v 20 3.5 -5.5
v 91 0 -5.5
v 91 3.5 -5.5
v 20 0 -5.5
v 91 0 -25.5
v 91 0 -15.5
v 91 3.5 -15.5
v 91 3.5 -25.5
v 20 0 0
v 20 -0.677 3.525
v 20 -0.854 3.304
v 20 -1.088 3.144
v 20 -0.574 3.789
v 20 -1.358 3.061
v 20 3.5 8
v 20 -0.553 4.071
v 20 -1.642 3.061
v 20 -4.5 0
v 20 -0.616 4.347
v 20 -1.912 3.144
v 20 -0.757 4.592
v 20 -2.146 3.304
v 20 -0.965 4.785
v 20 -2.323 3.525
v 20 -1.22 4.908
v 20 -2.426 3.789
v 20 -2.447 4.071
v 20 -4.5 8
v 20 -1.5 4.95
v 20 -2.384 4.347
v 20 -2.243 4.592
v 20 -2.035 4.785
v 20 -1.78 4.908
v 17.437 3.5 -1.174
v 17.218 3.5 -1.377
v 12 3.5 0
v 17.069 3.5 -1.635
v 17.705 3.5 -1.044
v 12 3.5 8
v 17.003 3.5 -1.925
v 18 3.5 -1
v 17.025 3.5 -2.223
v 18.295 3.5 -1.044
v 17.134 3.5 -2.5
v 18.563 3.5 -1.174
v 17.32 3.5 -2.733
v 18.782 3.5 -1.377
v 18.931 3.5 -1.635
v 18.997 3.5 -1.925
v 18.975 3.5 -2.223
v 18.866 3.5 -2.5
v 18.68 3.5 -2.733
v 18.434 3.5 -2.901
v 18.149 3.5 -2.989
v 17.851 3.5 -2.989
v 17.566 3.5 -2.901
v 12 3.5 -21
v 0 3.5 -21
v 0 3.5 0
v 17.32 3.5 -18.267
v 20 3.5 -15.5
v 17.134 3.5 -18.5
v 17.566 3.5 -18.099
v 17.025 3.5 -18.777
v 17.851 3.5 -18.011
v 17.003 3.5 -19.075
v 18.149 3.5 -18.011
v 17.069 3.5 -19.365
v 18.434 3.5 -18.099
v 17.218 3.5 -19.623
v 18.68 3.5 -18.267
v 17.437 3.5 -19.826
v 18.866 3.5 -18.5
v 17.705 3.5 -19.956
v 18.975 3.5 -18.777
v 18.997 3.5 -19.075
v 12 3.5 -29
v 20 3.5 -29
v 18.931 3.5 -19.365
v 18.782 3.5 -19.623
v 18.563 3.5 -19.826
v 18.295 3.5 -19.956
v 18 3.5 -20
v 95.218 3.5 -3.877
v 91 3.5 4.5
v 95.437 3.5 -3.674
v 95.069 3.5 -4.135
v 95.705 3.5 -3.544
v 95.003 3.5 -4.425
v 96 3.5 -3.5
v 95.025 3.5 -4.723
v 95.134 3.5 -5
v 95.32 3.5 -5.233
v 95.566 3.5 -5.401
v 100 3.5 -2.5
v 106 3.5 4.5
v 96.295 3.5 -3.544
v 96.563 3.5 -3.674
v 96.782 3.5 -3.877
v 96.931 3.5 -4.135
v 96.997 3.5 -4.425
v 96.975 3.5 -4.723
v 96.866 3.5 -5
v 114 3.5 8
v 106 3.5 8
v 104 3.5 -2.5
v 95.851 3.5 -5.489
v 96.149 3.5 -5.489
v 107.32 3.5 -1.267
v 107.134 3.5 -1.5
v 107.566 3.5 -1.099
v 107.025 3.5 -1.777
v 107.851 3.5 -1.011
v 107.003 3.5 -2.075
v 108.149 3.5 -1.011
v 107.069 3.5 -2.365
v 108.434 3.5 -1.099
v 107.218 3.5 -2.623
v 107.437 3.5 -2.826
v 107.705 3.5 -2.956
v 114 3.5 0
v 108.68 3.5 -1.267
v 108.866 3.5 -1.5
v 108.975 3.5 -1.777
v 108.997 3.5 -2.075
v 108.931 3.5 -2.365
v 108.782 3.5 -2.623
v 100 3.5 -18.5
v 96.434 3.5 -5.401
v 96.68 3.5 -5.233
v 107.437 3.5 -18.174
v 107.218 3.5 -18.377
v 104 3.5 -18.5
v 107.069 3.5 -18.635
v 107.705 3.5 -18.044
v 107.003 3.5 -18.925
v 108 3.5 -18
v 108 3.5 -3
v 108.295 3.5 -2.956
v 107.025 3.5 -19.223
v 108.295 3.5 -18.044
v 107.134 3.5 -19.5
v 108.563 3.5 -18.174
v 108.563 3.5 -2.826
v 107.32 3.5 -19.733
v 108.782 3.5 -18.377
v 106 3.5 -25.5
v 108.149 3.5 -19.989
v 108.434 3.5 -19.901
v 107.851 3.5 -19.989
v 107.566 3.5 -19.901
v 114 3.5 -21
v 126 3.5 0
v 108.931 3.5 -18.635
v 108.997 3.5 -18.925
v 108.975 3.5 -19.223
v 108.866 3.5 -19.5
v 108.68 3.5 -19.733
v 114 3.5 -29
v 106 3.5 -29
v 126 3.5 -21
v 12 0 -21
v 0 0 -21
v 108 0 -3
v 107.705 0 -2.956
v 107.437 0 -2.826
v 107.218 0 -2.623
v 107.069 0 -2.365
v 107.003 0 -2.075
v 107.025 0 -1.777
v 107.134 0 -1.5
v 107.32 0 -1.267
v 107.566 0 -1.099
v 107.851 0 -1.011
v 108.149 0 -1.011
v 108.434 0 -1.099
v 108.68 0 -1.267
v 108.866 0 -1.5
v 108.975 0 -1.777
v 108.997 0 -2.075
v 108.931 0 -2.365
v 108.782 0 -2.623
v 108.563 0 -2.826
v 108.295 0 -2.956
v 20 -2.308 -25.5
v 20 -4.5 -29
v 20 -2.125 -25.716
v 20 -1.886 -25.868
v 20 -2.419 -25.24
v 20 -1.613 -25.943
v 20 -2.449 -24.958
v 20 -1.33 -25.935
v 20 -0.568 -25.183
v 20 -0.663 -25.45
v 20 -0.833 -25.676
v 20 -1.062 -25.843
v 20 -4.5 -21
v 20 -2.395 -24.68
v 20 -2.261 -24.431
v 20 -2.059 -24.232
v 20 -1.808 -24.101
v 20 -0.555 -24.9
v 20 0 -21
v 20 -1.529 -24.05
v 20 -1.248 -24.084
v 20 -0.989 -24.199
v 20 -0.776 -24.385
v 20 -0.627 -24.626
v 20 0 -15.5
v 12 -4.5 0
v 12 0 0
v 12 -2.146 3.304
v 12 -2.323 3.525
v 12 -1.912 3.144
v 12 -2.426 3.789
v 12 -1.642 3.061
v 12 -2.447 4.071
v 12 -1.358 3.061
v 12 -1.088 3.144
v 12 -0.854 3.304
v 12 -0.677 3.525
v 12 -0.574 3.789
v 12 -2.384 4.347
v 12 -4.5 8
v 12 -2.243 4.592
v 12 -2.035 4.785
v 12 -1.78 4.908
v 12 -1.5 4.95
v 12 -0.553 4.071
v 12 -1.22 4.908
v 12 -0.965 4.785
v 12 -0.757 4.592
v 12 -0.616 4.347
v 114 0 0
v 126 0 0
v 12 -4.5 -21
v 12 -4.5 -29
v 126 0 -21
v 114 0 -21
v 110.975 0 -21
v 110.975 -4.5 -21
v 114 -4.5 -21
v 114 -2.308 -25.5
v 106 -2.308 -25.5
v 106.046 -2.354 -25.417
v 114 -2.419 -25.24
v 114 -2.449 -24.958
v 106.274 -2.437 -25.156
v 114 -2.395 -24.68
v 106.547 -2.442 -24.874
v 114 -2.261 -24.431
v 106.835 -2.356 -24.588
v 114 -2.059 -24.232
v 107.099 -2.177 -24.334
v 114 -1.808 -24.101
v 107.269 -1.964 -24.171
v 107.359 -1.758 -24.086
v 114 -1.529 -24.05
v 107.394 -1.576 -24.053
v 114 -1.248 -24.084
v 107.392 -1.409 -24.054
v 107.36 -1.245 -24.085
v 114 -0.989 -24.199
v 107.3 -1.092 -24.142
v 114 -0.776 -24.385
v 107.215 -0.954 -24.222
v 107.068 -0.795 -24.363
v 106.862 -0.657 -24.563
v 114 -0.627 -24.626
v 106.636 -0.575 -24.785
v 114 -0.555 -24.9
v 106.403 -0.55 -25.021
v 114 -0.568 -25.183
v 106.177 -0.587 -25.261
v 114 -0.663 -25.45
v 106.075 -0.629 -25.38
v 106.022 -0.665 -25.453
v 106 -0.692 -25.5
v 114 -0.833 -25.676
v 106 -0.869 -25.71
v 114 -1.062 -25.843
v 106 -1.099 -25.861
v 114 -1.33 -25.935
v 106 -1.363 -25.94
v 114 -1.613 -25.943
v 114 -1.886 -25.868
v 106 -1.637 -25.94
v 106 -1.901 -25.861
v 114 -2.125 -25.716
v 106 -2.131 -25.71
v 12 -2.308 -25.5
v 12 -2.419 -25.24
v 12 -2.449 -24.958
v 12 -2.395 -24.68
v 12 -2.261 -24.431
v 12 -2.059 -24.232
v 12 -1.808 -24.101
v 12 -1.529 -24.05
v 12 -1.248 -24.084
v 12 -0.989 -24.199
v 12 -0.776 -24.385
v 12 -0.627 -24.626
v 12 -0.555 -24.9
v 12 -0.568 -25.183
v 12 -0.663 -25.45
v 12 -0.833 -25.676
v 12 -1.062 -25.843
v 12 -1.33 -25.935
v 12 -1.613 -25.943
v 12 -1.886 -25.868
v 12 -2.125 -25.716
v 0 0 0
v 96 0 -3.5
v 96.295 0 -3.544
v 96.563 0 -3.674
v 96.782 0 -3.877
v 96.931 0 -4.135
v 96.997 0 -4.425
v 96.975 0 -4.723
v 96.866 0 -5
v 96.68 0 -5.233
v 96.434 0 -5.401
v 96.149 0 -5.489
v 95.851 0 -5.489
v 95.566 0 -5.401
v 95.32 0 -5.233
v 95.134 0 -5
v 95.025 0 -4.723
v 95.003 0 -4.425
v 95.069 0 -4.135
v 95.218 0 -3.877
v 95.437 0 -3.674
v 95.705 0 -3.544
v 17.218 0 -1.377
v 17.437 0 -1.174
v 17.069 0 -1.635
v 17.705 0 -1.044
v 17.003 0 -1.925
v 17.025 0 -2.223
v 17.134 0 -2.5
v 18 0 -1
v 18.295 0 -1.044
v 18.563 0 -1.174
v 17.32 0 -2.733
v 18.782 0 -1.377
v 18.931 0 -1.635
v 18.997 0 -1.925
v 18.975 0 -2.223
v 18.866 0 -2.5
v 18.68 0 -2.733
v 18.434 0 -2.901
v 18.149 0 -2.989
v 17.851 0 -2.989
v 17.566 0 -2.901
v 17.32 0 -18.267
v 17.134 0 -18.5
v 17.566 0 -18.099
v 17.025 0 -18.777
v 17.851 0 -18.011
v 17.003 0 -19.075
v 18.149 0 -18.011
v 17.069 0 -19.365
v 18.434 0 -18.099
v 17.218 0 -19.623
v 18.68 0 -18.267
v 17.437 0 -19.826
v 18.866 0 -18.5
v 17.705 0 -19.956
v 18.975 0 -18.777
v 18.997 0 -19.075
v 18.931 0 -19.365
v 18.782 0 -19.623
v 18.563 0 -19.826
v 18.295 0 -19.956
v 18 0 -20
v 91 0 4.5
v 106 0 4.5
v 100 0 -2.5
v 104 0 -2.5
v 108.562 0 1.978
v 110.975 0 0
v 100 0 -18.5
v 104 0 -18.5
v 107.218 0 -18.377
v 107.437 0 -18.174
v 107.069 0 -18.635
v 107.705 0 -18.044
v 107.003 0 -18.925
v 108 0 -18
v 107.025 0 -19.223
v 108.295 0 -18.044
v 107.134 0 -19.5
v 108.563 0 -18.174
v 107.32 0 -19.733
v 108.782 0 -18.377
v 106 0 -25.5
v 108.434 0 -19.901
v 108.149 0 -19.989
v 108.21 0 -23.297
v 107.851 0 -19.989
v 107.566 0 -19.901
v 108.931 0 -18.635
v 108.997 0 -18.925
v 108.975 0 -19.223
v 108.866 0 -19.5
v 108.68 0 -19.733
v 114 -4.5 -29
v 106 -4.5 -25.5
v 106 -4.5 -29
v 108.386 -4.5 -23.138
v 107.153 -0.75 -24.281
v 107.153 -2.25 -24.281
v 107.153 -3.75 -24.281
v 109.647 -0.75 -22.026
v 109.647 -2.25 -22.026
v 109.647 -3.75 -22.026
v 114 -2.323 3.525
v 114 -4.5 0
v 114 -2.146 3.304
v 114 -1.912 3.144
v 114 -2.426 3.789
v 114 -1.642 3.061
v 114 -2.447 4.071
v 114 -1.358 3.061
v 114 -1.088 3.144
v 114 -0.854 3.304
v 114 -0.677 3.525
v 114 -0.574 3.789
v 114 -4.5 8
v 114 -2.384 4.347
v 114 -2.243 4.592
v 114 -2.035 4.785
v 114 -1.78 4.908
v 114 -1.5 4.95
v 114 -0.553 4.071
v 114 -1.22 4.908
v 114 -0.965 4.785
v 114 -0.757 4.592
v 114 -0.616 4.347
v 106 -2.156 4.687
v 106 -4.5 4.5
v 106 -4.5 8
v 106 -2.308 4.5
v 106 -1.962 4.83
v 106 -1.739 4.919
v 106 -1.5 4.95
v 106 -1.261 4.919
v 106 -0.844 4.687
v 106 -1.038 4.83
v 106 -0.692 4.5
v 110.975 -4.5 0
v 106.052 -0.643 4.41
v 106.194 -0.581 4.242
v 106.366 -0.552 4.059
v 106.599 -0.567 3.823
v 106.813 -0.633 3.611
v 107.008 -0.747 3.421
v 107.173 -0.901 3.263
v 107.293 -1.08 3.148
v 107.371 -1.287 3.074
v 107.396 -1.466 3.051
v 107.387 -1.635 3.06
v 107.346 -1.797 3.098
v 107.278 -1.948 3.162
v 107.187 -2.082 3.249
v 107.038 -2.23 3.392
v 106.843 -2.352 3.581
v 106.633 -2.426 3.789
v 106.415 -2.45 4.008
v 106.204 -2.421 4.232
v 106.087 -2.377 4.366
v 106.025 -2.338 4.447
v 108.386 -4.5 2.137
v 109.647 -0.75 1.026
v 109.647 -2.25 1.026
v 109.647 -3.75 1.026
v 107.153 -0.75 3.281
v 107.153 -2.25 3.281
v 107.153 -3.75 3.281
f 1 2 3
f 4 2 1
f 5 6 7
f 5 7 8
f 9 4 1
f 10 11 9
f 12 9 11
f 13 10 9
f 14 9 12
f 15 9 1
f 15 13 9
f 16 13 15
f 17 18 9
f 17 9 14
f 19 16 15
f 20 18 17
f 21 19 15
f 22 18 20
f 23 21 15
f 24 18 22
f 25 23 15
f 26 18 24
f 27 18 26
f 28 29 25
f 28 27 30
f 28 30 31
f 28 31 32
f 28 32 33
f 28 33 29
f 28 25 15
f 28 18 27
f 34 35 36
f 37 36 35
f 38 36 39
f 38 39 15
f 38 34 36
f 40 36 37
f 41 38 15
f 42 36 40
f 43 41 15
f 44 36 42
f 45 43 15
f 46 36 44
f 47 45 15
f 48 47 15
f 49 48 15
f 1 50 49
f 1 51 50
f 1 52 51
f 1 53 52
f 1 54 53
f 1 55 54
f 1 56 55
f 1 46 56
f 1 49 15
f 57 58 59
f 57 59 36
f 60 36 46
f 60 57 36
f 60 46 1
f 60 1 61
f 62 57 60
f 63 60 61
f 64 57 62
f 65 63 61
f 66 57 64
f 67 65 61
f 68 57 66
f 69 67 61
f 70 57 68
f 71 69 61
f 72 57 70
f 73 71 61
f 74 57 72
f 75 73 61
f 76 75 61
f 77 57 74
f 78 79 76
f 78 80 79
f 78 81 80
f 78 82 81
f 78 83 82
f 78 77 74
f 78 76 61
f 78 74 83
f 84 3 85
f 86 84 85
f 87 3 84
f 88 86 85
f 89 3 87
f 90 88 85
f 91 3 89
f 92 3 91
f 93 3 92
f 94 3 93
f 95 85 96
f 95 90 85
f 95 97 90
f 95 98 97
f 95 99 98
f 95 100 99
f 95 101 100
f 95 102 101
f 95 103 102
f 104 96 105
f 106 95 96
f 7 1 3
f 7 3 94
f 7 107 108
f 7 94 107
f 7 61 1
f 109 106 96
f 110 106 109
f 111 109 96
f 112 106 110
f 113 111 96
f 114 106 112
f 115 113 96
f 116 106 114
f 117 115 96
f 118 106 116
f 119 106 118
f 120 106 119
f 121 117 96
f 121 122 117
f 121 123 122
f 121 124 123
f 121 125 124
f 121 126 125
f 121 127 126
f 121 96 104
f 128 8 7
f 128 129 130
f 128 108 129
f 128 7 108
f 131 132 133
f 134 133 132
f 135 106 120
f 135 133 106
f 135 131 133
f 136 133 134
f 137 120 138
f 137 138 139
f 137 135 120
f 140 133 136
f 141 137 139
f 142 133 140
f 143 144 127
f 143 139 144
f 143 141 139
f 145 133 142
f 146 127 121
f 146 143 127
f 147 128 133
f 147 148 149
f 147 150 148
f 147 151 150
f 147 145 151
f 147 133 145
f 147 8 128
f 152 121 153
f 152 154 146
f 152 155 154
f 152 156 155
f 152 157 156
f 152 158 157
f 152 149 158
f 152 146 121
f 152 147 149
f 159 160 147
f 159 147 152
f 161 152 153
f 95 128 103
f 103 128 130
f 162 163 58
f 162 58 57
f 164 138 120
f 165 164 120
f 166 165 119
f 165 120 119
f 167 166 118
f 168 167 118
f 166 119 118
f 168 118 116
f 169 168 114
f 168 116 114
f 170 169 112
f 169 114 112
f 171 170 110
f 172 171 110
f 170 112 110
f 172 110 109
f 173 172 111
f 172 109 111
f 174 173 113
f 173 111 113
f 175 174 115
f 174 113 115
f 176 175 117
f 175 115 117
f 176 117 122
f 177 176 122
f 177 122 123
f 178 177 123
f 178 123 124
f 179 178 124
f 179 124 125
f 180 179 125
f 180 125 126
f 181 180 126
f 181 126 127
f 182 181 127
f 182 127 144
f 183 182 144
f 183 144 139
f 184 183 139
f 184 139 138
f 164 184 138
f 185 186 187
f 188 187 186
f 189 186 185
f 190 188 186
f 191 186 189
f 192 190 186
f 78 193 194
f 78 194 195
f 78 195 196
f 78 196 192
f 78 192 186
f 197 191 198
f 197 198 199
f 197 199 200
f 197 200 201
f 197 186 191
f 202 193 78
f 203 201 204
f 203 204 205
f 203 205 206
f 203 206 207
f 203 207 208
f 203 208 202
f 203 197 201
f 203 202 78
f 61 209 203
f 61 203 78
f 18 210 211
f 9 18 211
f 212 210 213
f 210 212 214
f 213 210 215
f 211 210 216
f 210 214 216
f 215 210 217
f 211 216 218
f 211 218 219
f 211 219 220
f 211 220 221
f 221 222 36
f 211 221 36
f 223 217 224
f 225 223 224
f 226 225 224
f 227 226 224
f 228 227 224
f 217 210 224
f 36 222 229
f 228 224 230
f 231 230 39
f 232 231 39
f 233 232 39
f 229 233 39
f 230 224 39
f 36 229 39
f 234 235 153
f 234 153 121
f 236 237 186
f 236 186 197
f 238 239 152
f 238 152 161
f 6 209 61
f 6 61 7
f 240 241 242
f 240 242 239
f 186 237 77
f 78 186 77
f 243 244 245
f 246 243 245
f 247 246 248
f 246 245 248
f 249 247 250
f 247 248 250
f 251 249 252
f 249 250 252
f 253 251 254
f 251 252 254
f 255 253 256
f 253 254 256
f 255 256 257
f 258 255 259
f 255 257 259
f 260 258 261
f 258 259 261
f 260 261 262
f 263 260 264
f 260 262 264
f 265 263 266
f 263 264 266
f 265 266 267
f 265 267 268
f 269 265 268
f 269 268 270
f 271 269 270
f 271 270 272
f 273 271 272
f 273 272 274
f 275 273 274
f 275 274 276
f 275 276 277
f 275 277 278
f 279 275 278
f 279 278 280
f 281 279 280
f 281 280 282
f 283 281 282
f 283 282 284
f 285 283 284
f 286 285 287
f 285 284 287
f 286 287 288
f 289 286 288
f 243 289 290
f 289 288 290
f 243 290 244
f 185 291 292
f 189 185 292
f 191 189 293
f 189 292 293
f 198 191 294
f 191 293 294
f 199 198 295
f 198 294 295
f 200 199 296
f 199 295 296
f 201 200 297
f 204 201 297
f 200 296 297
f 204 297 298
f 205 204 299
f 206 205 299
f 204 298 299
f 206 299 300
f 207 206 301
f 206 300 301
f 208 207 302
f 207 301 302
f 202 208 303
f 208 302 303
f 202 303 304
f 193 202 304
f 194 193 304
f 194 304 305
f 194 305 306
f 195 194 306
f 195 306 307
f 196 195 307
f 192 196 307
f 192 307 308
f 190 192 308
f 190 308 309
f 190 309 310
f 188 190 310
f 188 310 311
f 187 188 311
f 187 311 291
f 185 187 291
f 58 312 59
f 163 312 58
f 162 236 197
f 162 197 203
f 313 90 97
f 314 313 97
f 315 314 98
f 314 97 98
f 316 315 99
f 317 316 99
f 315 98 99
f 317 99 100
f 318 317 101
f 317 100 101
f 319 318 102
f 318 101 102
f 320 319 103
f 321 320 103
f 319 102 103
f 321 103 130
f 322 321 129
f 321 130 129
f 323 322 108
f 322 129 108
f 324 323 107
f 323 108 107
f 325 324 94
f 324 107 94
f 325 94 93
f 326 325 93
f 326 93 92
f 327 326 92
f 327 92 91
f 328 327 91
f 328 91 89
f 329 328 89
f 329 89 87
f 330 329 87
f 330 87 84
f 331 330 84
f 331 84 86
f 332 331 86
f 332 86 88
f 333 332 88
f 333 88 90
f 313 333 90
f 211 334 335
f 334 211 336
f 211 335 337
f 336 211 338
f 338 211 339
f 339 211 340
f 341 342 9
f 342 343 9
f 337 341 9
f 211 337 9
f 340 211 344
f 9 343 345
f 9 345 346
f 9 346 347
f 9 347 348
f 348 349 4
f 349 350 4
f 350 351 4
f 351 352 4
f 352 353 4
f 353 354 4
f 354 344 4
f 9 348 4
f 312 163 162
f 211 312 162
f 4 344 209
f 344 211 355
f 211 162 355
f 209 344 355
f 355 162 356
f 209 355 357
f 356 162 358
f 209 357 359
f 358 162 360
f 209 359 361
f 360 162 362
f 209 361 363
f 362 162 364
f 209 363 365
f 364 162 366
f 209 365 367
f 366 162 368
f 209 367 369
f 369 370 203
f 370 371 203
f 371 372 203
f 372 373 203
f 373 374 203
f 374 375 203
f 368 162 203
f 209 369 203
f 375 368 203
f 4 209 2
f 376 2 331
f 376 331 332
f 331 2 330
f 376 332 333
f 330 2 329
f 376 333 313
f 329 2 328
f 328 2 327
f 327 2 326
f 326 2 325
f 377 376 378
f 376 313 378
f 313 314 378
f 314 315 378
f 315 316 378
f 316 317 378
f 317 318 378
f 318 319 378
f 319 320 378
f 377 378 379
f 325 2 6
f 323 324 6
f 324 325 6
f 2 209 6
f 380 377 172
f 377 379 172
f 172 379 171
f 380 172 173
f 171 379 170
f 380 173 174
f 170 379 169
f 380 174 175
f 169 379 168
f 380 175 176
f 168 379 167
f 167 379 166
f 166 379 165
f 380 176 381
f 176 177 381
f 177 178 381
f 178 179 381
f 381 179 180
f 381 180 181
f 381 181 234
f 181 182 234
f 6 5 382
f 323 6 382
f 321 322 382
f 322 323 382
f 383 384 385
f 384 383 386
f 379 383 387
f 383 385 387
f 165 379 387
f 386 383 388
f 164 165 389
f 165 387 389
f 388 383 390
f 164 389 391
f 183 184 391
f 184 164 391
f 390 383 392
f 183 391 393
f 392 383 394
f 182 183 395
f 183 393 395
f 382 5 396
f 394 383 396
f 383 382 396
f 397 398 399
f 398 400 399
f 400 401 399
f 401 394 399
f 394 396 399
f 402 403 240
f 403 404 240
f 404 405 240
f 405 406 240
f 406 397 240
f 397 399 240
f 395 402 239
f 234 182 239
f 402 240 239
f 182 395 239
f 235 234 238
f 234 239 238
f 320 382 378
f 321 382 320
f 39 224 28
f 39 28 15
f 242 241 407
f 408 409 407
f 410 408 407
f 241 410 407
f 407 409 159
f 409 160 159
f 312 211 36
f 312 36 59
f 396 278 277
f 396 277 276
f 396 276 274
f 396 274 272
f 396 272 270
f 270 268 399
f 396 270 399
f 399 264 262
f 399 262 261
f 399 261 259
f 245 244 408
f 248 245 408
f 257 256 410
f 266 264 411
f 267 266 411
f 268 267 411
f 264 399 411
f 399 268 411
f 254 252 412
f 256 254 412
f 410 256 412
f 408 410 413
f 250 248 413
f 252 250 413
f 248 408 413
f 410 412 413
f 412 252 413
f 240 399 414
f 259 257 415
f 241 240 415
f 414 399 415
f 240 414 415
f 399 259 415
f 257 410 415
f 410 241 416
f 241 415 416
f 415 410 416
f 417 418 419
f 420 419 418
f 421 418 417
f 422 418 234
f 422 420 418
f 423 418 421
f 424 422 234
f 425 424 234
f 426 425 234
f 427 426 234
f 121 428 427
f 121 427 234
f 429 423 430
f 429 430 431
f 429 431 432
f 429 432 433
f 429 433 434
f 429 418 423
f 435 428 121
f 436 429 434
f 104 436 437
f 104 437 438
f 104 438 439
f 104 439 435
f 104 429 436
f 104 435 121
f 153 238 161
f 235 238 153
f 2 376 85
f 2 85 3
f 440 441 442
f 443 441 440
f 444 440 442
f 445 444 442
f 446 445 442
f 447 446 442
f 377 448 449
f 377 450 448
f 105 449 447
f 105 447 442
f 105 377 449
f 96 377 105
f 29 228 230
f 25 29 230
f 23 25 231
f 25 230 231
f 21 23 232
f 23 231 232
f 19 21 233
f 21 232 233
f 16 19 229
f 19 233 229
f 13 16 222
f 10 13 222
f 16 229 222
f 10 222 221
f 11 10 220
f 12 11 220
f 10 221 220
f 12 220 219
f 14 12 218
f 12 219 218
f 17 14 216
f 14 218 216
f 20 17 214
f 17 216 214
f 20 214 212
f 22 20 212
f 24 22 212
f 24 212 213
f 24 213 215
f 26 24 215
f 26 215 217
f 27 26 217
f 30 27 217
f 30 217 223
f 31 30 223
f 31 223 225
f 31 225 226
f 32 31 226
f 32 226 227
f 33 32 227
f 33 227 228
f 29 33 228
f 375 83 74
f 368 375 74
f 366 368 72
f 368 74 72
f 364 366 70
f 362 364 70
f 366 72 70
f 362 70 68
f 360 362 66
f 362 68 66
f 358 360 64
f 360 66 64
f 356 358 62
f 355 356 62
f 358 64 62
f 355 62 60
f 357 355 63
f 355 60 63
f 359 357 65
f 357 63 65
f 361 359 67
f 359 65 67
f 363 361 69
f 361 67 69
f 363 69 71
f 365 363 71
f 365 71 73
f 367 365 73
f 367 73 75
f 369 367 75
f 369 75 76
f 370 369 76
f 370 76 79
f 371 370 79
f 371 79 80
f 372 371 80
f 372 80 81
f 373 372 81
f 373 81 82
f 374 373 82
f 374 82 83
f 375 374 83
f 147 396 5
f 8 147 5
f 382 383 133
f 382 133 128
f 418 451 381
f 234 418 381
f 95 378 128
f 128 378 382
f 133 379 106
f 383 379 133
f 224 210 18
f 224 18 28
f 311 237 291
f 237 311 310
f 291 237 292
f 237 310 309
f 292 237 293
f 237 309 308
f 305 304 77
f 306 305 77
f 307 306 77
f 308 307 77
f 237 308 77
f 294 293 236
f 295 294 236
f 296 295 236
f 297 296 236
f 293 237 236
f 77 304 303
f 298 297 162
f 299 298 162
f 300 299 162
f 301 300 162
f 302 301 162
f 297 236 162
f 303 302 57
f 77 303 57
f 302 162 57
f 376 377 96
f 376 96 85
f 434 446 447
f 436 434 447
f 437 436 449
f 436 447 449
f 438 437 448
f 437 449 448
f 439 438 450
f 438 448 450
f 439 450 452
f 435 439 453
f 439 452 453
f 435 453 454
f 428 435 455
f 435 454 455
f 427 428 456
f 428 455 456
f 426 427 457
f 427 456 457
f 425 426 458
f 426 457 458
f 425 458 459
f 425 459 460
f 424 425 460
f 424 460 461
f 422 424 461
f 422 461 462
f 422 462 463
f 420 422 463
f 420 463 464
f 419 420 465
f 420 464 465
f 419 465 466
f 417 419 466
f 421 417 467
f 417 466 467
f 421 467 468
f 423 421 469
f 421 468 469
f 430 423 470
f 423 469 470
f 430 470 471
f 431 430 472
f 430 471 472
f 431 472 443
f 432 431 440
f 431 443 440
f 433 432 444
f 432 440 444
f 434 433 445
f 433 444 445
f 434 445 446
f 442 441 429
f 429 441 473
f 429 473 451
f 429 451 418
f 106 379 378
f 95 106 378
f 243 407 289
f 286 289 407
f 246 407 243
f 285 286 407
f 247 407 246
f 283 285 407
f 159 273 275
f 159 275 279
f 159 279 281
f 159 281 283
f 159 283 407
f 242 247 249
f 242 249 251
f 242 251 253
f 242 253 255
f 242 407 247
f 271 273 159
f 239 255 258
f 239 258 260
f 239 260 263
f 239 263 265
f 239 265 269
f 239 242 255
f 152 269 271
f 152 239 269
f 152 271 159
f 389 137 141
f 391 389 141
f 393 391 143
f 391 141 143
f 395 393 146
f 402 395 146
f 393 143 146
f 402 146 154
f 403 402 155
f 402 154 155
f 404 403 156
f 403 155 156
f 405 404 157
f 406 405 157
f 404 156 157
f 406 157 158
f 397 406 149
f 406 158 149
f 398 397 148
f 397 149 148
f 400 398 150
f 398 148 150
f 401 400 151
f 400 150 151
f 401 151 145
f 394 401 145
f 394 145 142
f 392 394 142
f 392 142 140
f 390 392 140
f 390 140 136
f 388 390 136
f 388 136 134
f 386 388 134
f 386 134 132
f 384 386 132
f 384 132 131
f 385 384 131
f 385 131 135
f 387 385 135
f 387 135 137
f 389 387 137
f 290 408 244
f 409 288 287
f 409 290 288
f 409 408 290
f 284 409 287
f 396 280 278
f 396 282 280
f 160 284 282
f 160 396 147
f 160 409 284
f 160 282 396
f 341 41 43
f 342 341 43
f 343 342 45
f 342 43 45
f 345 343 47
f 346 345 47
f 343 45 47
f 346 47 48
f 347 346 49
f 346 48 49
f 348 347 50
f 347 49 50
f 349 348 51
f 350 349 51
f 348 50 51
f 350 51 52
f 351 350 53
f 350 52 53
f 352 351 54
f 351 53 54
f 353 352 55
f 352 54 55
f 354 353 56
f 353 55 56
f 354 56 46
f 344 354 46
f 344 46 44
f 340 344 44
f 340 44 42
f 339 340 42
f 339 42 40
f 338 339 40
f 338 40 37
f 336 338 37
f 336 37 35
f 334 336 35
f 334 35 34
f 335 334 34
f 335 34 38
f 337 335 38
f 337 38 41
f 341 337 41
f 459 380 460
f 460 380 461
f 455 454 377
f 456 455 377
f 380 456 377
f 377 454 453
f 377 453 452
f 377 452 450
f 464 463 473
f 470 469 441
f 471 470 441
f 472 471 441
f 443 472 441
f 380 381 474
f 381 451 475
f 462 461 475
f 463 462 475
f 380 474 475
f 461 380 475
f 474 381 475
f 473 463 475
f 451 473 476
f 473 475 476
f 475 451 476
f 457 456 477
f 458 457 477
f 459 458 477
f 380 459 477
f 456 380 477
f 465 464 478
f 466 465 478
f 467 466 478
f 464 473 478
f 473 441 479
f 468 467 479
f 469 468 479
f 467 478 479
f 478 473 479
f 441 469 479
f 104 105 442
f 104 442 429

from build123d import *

# Parameters (mm, degrees)
EXTRUDE_1_DEPTH       = 3.5
SKETCH_2_R            = 1
CUT_EXTRUDE_1_DEPTH   = 128.785953845
SKETCH_3_W            = 15
SKETCH_3_H            = 10
EXTRUDE_2_DEPTH       = 3.5
SKETCH_4_W            = 4
SKETCH_4_H            = 16
CUT_EXTRUDE_2_DEPTH   = 5
FILLET_1_DEPTH        = 3.5
EXTRUDE_START         = 12
EXTRUDE_3_OUTLINE_W   = 8
EXTRUDE_3_OUTLINE_H   = 8
EXTRUDE_3_DEPTH       = 8
EXTRUDE_START_2       = 110.974937086
EXTRUDE_3_2_OUTLINE_W = 8
EXTRUDE_3_2_OUTLINE_H = 8
EXTRUDE_3_2_DEPTH     = 3.025062914
EXTRUDE_START_3       = -29
EXTRUDE_3_3_OUTLINE_W = 4.974937086
EXTRUDE_3_3_OUTLINE_H = 3.5
EXTRUDE_3_3_DEPTH     = 8.0000001
EXTRUDE_START_4       = -1e-07
EXTRUDE_3_4_OUTLINE_W = 4.974937086
EXTRUDE_3_4_OUTLINE_H = 3.5
EXTRUDE_3_4_DEPTH     = 8.0000001
EXTRUDE_START_5       = 4.5
EXTRUDE_3_5_OUTLINE_W = 4.974937086
EXTRUDE_3_5_OUTLINE_H = 4.5
EXTRUDE_3_5_DEPTH     = 3.5
EXTRUDE_3_6_OUTLINE_W = 4.974937086
EXTRUDE_3_6_OUTLINE_H = 4.5
EXTRUDE_3_6_DEPTH     = 3.4999999
EXTRUDE_START_6       = -4.5
EXTRUDE_3_7_DEPTH     = 5.5
SKETCH_6_R            = 0.95
CUT_EXTRUDE_3_DEPTH   = 118.716821353
SKETCH_7_R            = 1
CUT_EXTRUDE_4_DEPTH   = 130.541499268


with BuildPart() as part:
    # 草图1 → 凸台-拉伸1 (new body)
    with BuildSketch(Plane(origin=(0, 0, 0), x_dir=(1, 0, 0), z_dir=(0, 1, 0))):
        Polygon((106, 15.5), (106, 21), (126, 21), (126, 0), (106, 0), (106, 5.5), (20, 5.5), (20, 0), (0, 0), (0, 21), (20, 21), (20, 15.5), align=None)
    extrude(amount=EXTRUDE_1_DEPTH)

    # 草图2 → 切除-拉伸1 (cut, through all)
    with BuildSketch(Plane(origin=(0, 3.5, 0), x_dir=(1, 0, 0), z_dir=(0, 1, 0))):
        with Locations(Location((108, 19, 0), (0, 0, 270))):
            Circle(SKETCH_2_R)
        with Locations(Location((108, 2, 0), (0, 0, 90))):
            Circle(SKETCH_2_R)
        with Locations(Location((18, 19, 0), (0, 0, 90))):
            Circle(SKETCH_2_R)
        with Locations(Location((18, 2, 0), (0, 0, 270))):
            Circle(SKETCH_2_R)
    extrude(amount=-CUT_EXTRUDE_1_DEPTH, mode=Mode.SUBTRACT)

    # 草图3 → 凸台-拉伸2 (add)
    with BuildSketch(Plane(origin=(0, 0, 0), x_dir=(-1, 0, 0), z_dir=(0, -1, 0))):
        with Locations((-98.5, 20.5)):
            Rectangle(SKETCH_3_W, SKETCH_3_H)
        with Locations((-98.5, 0.5)):
            Rectangle(SKETCH_3_W, SKETCH_3_H)
    extrude(amount=-EXTRUDE_2_DEPTH)

    # 草图4 → 切除-拉伸2 (cut)
    with BuildSketch(Plane(origin=(0, 0, 0), x_dir=(-1, 0, 0), z_dir=(0, -1, 0))):
        with Locations((-102, 10.5)):
            Rectangle(SKETCH_4_W, SKETCH_4_H)
    extrude(amount=-CUT_EXTRUDE_2_DEPTH, mode=Mode.SUBTRACT)

    # 圆角1: read off the stored shape, not the designer's step
    # 圆角1 outline → 圆角1 (add)
    with BuildSketch(Plane(origin=(0, 0, 0), x_dir=(1, 0, 0), z_dir=(0, 1, 0))):
        with BuildLine():
            Line((106, 21), (110.974937186, 21))
            add(Edge.make_bspline(
                [(110.974937186, 21), (106.452267017, 21), (106, 25.5)],
                knots=[0, 0, 0, 1, 1, 1], degree=2, weights=[1, 0.052631579, 1]))
            Line((106, 25.5), (106, 21))
        make_face()
        with BuildLine():
            add(Edge.make_bspline(
                [(110.974937186, 0), (106.452267017, 0), (106, -4.5)],
                knots=[0, 0, 0, 1, 1, 1], degree=2, weights=[1, 0.052631579, 1]))
            Line((110.974937186, 0), (106, 0))
            Line((106, 0), (106, -4.5))
        make_face()
    extrude(amount=FILLET_1_DEPTH)

    # 凸台-拉伸3: read off the stored shape, not the designer's step
    # 凸台-拉伸3 outline → 凸台-拉伸3 (add)
    with BuildSketch(Plane.YZ.offset(EXTRUDE_START)):
        with Locations((-0.5, -25)):
            Rectangle(EXTRUDE_3_OUTLINE_W, EXTRUDE_3_OUTLINE_H)
        with Locations((-0.5, 4)):
            Rectangle(EXTRUDE_3_OUTLINE_W, EXTRUDE_3_OUTLINE_H)
    extrude(amount=EXTRUDE_3_DEPTH)

    # Extrude 3 2 outline → Extrude 3 2 (add)
    with BuildSketch(Plane.YZ.offset(EXTRUDE_START_2)):
        with Locations((-0.5, -25)):
            Rectangle(EXTRUDE_3_2_OUTLINE_W, EXTRUDE_3_2_OUTLINE_H)
        with Locations((-0.5, 4)):
            Rectangle(EXTRUDE_3_2_OUTLINE_W, EXTRUDE_3_2_OUTLINE_H)
    extrude(amount=EXTRUDE_3_2_DEPTH)

    # Extrude 3 3 outline → Extrude 3 3 (add)
    with BuildSketch(Plane.XY.offset(EXTRUDE_START_3)):
        with Locations((108.487468543, 1.75)):
            Rectangle(EXTRUDE_3_3_OUTLINE_W, EXTRUDE_3_3_OUTLINE_H)
    extrude(amount=EXTRUDE_3_3_DEPTH)

    # Extrude 3 4 outline → Extrude 3 4 (add)
    with BuildSketch(Plane.XY.offset(EXTRUDE_START_4)):
        with Locations((108.487468543, 1.75)):
            Rectangle(EXTRUDE_3_4_OUTLINE_W, EXTRUDE_3_4_OUTLINE_H)
    extrude(amount=EXTRUDE_3_4_DEPTH)

    # Extrude 3 5 outline → Extrude 3 5 (add)
    with BuildSketch(Plane.XY.offset(EXTRUDE_START_5)):
        with Locations((108.487468543, -2.25)):
            Rectangle(EXTRUDE_3_5_OUTLINE_W, EXTRUDE_3_5_OUTLINE_H)
    extrude(amount=EXTRUDE_3_5_DEPTH)

    # Extrude 3 6 outline → Extrude 3 6 (add)
    with BuildSketch(Plane.XY.offset(EXTRUDE_START_3)):
        with Locations((108.487468543, -2.25)):
            Rectangle(EXTRUDE_3_6_OUTLINE_W, EXTRUDE_3_6_OUTLINE_H)
    extrude(amount=EXTRUDE_3_6_DEPTH)

    # Extrude 3 7 outline → Extrude 3 7 (add)
    with BuildSketch(Plane(origin=(0, 0, 0), x_dir=(1, 0, 0), z_dir=(0, 1, 0)).offset(EXTRUDE_START_6)):
        with BuildLine():
            Line((110.974937186, 21), (114, 21))
            Line((114, 21), (114, 29))
            Line((114, 29), (106, 29))
            Line((106, 29), (106, 25.5))
            add(Edge.make_bspline(
                [(106, 25.5), (106.009269507, 25.407769569), (106.671100156, 24.750288943), (106.886833575, 24.535973478), (107.15337097, 24.28118269), (107.717435122, 23.741977487), (108.385645722, 23.137556797), (109.053934894, 22.533065037), (109.646910819, 22.025691943), (109.949857187, 21.766479336), (110.199076342, 21.562212351), (110.885012382, 21), (110.974937186, 21)],
                knots=[0, 0, 0, 0.15, 0.15, 0.25, 0.25, 0.5, 0.5, 0.75, 0.75, 0.857142857, 0.857142857, 1, 1, 1], degree=2))
        make_face()
        with BuildLine():
            Line((114, -8), (114, 0))
            Line((114, 0), (110.974937186, 0))
            add(Edge.make_bspline(
                [(110.974937186, 0), (110.882242115, 0), (110.161874087, -0.592765119), (109.92705955, -0.785985614), (109.646892177, -1.025707894), (109.053983358, -1.533024119), (108.385771306, -2.137443203), (107.717480681, -2.741933357), (107.153353234, -3.281199644), (106.86514531, -3.556706213), (106.636980311, -3.784249442), (106.00899248, -4.41052595), (106, -4.5)],
                knots=[0, 0, 0, 0.15, 0.15, 0.25, 0.25, 0.5, 0.5, 0.75, 0.75, 0.857142857, 0.857142857, 1, 1, 1], degree=2))
            Line((106, -4.5), (106, -8))
            Line((106, -8), (114, -8))
        make_face()
    extrude(amount=EXTRUDE_3_7_DEPTH)

    # 草图6 → 切除-拉伸3 (cut, through all)
    with BuildSketch(Plane.ZY.offset(-12)):
        with Locations(Location((-25, -1.5, 0), (0, 0, 238.243136141))):
            Circle(SKETCH_6_R)
        with Locations((4, -1.5)):
            Circle(SKETCH_6_R)
    extrude(amount=-CUT_EXTRUDE_3_DEPTH, mode=Mode.SUBTRACT)

    # 草图7 → 切除-拉伸4 (cut, through all)
    with BuildSketch(Plane(origin=(0, 3.5, 0), x_dir=(1, 0, 0), z_dir=(0, 1, 0))):
        with Locations(Location((96, 4.5, 0), (0, 0, 270))):
            Circle(SKETCH_7_R)
    extrude(amount=-CUT_EXTRUDE_4_DEPTH, mode=Mode.SUBTRACT)


solid = part.part
